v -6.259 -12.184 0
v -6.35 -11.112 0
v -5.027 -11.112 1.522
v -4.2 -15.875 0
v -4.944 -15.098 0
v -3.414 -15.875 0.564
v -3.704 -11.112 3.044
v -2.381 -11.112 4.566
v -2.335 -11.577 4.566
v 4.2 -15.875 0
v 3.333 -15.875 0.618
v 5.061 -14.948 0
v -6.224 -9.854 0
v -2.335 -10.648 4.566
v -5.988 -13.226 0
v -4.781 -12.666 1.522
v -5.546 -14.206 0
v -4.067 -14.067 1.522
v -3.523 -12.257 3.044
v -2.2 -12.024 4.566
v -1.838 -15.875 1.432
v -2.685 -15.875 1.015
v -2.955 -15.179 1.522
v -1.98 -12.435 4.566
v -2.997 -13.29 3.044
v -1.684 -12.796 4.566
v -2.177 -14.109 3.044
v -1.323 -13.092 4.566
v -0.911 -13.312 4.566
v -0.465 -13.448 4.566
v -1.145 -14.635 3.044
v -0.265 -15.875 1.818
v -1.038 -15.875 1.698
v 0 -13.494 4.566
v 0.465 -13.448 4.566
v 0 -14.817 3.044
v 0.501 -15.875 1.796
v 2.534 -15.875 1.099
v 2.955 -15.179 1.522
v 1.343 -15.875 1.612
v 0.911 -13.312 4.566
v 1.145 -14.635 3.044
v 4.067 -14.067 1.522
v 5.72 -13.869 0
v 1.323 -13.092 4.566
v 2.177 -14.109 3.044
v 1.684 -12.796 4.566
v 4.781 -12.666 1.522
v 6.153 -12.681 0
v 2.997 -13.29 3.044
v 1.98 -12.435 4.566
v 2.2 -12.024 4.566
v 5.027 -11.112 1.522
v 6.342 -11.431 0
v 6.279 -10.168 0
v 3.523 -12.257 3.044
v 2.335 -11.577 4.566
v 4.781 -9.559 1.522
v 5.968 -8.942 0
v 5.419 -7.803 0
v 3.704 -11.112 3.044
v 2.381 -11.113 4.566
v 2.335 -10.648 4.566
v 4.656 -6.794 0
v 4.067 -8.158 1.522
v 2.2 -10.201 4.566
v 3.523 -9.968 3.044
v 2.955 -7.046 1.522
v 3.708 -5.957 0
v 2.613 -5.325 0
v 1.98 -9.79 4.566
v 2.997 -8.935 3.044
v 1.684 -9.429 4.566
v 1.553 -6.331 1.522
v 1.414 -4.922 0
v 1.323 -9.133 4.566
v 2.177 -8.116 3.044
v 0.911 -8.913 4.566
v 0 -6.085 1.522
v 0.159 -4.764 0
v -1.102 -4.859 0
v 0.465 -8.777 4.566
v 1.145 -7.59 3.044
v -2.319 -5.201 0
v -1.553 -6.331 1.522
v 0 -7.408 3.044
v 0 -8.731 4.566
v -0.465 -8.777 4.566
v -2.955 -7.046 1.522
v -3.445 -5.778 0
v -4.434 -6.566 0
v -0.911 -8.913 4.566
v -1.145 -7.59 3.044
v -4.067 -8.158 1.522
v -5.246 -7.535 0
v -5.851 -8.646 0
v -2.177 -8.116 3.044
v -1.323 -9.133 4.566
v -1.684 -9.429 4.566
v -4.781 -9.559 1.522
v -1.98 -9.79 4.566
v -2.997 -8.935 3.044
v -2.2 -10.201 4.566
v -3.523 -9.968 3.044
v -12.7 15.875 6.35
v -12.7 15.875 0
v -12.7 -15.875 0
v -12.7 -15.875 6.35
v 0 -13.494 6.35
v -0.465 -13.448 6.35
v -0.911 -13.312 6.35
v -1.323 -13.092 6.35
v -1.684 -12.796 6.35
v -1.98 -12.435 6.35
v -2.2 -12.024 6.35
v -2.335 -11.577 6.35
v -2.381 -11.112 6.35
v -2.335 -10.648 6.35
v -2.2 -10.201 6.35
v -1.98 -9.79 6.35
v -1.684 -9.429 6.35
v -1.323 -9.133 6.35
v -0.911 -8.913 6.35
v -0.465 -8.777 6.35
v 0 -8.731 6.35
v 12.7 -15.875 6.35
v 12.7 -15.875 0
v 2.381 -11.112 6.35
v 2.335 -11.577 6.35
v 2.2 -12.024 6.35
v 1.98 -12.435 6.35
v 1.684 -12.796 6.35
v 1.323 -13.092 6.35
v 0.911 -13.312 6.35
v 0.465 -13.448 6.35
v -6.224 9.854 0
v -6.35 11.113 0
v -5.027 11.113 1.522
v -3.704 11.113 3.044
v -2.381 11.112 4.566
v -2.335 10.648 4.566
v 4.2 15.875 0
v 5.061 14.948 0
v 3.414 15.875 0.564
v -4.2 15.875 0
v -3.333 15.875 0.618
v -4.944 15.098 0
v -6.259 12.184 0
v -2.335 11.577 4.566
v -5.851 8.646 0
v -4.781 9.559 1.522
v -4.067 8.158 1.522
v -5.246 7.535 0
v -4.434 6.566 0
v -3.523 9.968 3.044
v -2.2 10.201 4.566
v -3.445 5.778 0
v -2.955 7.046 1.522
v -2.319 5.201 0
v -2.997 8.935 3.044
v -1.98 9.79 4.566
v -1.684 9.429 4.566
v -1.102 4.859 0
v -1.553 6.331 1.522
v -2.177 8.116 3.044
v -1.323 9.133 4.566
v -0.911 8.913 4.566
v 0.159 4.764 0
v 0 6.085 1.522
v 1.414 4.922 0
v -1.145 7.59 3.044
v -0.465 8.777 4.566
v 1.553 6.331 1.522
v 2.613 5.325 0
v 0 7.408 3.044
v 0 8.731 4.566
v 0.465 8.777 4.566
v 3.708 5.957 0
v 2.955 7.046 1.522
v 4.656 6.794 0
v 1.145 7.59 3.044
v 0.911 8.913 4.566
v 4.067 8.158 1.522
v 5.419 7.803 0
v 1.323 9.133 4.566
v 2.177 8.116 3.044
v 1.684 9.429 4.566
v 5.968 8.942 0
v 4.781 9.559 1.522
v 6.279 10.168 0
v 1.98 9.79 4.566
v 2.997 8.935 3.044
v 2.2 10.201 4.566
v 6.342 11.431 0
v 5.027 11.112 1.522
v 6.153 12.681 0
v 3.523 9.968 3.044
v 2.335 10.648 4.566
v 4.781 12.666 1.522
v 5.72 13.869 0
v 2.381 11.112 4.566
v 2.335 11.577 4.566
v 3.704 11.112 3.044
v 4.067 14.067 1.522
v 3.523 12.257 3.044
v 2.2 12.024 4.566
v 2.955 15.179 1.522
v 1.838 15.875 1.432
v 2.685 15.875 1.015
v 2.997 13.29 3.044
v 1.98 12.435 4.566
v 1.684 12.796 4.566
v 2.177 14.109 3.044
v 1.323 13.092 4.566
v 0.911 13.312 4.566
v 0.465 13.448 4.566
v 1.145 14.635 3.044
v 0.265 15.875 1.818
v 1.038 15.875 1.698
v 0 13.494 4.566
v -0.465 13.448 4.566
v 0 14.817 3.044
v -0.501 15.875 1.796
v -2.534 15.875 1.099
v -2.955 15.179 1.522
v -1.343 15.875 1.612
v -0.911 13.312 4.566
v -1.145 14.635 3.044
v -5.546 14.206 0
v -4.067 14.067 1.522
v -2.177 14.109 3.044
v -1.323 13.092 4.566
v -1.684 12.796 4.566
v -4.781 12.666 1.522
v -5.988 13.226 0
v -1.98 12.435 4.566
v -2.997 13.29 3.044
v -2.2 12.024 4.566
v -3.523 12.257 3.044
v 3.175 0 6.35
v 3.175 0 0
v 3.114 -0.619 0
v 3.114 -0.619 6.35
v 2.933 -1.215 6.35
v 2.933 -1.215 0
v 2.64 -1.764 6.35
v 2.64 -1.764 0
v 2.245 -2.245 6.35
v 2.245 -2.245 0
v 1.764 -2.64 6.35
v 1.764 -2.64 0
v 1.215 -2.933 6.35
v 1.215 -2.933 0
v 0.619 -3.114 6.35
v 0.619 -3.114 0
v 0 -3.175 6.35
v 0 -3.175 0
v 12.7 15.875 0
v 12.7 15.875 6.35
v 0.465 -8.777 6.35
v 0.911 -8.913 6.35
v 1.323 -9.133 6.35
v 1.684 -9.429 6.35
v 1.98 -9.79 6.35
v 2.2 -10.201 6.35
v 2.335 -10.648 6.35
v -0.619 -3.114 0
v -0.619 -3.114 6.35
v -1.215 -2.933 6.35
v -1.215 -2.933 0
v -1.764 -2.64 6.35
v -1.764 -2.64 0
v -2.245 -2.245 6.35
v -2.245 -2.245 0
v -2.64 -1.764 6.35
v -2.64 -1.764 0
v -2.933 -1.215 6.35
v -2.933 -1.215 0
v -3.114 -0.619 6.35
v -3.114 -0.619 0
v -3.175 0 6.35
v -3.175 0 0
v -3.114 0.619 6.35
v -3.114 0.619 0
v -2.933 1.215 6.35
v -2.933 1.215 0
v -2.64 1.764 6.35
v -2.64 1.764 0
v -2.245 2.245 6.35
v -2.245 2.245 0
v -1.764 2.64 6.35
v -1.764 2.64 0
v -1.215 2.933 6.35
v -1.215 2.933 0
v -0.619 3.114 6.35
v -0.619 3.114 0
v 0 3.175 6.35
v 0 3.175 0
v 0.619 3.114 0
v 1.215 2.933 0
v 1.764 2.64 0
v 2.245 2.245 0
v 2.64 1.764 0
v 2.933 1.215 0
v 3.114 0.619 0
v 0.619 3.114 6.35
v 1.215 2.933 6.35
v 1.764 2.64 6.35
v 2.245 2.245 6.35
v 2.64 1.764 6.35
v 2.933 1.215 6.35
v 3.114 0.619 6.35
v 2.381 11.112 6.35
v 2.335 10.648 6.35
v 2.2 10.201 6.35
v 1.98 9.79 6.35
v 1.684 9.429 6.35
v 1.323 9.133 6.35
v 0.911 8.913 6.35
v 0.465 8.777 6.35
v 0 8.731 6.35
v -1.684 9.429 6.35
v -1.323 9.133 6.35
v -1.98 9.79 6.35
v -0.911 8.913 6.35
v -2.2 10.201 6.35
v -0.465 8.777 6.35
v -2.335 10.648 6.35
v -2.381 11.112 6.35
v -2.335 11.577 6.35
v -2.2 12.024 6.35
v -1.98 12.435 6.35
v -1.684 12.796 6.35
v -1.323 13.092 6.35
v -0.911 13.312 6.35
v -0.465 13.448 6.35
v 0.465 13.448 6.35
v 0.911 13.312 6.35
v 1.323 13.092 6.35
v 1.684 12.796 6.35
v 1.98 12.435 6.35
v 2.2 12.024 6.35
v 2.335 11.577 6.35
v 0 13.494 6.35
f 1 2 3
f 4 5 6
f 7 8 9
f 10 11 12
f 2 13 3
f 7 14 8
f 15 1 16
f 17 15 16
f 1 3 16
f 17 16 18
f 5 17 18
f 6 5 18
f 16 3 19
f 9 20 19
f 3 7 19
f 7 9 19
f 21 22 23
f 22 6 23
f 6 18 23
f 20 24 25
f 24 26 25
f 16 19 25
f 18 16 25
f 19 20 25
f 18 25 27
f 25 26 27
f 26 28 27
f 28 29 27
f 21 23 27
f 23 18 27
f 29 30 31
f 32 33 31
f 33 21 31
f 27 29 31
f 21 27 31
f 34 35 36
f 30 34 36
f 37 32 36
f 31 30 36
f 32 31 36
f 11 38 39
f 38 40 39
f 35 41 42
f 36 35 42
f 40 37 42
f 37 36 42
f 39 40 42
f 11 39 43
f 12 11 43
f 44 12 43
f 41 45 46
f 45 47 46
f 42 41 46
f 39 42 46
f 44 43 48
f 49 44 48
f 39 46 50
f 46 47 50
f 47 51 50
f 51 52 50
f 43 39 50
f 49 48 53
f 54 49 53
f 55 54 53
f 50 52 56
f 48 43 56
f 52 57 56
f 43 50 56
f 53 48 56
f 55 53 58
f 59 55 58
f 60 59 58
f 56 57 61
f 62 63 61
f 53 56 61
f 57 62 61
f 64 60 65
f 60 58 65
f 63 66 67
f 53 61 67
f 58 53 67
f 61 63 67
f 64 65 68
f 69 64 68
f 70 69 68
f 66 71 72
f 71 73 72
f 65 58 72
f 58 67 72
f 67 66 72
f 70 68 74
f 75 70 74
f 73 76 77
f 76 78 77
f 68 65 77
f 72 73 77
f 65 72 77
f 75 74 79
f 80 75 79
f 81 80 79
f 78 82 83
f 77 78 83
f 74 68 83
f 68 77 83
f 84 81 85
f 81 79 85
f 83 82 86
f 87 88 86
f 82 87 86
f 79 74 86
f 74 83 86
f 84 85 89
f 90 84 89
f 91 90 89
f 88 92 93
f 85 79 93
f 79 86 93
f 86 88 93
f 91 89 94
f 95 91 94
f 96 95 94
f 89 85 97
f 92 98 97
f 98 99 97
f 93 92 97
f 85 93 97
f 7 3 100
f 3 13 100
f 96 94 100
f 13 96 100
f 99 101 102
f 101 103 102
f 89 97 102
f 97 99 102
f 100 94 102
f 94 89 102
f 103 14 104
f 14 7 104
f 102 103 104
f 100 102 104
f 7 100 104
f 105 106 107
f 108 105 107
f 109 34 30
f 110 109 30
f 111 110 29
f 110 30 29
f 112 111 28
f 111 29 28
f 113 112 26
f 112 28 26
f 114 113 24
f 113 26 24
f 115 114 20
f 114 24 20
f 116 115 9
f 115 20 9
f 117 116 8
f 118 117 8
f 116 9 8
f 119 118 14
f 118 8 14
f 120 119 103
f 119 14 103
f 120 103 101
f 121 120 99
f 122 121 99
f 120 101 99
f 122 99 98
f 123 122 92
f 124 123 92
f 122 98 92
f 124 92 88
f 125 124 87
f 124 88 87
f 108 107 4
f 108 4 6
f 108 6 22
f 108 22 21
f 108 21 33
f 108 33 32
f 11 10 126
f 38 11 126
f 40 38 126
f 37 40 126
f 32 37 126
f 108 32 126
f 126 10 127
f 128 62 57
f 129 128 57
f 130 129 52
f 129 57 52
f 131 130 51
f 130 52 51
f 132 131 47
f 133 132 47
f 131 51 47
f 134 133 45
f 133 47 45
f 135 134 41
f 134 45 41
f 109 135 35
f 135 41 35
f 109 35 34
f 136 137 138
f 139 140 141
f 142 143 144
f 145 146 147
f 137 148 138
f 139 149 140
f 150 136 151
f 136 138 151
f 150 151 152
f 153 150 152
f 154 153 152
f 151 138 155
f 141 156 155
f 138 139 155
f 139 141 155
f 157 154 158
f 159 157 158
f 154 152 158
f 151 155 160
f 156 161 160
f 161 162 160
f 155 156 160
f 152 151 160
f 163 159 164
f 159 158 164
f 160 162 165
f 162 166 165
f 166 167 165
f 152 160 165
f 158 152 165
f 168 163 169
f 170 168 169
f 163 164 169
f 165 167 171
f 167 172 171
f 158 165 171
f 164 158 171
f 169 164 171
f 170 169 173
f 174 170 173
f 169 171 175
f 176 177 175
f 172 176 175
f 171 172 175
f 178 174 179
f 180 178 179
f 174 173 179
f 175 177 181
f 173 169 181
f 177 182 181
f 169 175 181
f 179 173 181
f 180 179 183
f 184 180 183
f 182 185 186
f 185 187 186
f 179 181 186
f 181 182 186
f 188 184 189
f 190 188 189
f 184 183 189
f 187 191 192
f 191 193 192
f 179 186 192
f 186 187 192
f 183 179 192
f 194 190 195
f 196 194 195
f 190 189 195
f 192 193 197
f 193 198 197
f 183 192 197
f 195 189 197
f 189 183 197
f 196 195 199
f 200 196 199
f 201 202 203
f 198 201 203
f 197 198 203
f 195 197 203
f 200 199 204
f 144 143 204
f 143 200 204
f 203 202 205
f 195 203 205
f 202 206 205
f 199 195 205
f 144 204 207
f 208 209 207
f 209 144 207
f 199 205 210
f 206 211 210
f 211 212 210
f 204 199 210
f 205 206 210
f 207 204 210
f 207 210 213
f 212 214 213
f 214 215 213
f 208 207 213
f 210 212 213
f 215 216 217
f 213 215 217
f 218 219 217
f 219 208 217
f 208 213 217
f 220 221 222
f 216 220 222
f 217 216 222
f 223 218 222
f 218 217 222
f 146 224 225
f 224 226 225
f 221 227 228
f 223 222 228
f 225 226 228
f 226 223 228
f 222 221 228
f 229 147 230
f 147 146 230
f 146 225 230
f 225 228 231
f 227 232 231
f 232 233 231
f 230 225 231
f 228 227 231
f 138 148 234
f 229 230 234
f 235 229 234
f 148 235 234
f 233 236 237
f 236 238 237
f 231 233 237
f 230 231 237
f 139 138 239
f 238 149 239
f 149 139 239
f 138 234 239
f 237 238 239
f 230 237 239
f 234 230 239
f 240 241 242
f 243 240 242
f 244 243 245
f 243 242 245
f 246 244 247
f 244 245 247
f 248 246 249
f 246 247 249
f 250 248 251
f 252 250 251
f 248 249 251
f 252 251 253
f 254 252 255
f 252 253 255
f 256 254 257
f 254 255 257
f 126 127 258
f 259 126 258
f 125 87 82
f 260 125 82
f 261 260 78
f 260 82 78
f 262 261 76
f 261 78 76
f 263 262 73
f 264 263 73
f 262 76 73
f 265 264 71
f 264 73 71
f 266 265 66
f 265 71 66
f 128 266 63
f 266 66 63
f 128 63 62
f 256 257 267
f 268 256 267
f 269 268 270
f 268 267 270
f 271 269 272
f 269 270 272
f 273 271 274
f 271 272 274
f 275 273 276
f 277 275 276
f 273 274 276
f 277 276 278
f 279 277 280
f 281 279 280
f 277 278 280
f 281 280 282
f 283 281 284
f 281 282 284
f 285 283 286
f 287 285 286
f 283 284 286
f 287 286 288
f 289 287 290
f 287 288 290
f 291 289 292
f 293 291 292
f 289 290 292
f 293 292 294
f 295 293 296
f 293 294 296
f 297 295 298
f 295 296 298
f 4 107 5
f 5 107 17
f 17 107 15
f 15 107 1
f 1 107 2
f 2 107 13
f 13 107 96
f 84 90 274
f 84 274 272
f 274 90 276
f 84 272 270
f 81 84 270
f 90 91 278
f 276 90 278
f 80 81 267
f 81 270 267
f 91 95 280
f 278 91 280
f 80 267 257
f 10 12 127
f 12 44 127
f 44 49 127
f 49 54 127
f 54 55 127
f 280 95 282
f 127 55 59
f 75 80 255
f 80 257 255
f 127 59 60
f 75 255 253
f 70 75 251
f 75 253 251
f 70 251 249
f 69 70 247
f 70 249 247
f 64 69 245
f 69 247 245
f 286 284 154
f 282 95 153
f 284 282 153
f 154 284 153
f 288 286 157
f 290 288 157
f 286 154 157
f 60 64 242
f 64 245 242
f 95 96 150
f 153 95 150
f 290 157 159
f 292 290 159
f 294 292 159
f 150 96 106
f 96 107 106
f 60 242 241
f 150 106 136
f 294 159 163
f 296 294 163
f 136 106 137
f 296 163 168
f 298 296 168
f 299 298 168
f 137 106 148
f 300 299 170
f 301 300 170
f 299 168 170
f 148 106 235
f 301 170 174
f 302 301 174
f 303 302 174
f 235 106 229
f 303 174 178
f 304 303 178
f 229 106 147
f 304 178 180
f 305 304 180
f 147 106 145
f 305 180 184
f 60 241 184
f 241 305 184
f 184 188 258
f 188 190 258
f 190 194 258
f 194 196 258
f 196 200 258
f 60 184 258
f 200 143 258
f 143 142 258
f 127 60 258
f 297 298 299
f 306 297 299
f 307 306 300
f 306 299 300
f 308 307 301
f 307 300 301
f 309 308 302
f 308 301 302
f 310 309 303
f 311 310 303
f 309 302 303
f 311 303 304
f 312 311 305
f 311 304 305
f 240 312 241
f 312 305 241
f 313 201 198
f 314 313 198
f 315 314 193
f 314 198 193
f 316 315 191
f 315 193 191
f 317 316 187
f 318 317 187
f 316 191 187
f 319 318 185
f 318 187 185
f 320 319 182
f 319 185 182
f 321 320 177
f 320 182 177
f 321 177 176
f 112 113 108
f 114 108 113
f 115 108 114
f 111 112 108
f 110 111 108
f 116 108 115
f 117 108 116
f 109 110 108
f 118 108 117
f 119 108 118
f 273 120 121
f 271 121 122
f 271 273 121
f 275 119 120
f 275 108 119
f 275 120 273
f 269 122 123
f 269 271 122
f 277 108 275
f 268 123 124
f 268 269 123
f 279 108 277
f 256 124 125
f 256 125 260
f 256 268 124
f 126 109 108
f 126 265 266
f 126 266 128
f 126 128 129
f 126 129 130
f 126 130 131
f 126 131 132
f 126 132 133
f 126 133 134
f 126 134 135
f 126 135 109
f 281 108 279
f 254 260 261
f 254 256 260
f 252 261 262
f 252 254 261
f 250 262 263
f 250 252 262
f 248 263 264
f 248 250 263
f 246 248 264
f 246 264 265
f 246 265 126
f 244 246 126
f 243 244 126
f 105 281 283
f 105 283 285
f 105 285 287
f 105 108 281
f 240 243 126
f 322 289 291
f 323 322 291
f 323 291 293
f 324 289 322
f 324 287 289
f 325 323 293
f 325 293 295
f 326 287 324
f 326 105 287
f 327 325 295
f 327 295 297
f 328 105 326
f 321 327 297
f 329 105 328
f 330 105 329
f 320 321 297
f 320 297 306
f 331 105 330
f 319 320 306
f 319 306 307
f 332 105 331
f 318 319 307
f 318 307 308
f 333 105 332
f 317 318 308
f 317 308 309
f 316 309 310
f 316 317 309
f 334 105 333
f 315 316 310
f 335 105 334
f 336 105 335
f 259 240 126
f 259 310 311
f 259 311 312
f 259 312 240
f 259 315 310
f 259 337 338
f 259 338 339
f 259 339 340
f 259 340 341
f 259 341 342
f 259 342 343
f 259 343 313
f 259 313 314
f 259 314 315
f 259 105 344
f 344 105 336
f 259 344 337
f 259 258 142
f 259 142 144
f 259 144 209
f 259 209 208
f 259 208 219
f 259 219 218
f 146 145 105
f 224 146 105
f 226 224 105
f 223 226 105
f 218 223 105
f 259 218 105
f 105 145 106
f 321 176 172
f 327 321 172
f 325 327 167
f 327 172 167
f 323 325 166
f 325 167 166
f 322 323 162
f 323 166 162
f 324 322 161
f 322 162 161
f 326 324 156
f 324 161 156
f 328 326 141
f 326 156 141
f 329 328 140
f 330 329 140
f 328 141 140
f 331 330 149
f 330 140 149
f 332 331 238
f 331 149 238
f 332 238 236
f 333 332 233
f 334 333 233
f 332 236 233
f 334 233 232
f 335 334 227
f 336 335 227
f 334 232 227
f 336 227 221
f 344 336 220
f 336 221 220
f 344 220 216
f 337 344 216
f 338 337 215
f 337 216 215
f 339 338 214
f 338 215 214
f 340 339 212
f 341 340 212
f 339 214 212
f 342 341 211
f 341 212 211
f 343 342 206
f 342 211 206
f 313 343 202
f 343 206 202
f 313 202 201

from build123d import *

# Parameters (mm, degrees)
F1_DEPTH       = 6.35
F2_D           = 4.7625
F2_CSINK_D     = 12.7
F2_CSINK_ANGLE = 82


with BuildPart() as f1:
    # F0 (on Top) → F1 (new body)
    with BuildSketch(Plane.XY):
        with BuildLine():
            Line((-12.7, 15.875), (-12.7, -15.875))
            Line((-12.7, -15.875), (0, -15.875))
            Line((0, -15.875), (0, -13.49375))
            ThreePointArc((0, -13.49375), (-2.38125, -11.1125), (0, -8.73125))
            Line((0, -8.73125), (0, -3.175))
            ThreePointArc((0, -3.175), (-3.175, 0), (0, 3.175))
            Line((0, 3.175), (0, 8.73125))
            ThreePointArc((0, 8.73125), (-2.38125, 11.1125), (0, 13.49375))
            Line((0, 13.49375), (0, 15.875))
            Line((0, 15.875), (-12.7, 15.875))
        make_face()
        with BuildLine():
            Line((0, -13.49375), (0, -15.875))
            Line((0, -15.875), (12.7, -15.875))
            Line((12.7, -15.875), (12.7, 15.875))
            Line((12.7, 15.875), (0, 15.875))
            Line((0, 15.875), (0, 13.49375))
            ThreePointArc((0, 13.49375), (1.683798, 12.796298), (2.38125, 11.1125))
            ThreePointArc((2.38125, 11.1125), (1.683798, 9.428702), (0, 8.73125))
            Line((0, 8.73125), (0, 3.175))
            ThreePointArc((0, 3.175), (2.245064, 2.245064), (3.175, 0))
            ThreePointArc((3.175, 0), (2.245064, -2.245064), (0, -3.175))
            Line((0, -3.175), (0, -8.73125))
            ThreePointArc((0, -8.73125), (1.683798, -9.428702), (2.38125, -11.1125))
            ThreePointArc((2.38125, -11.1125), (1.683798, -12.796298), (0, -13.49375))
        make_face()
    extrude(amount=F1_DEPTH)

    # F2 (through all)
    with Locations(Plane(origin=(0, 0, 0), x_dir=(1, 0, 0), z_dir=(0, 0, -1))):
        with Locations((0, 11.1125), (0, -11.1125)):
            CounterSinkHole(F2_D / 2, F2_CSINK_D / 2, counter_sink_angle=F2_CSINK_ANGLE)


solid = f1.part
